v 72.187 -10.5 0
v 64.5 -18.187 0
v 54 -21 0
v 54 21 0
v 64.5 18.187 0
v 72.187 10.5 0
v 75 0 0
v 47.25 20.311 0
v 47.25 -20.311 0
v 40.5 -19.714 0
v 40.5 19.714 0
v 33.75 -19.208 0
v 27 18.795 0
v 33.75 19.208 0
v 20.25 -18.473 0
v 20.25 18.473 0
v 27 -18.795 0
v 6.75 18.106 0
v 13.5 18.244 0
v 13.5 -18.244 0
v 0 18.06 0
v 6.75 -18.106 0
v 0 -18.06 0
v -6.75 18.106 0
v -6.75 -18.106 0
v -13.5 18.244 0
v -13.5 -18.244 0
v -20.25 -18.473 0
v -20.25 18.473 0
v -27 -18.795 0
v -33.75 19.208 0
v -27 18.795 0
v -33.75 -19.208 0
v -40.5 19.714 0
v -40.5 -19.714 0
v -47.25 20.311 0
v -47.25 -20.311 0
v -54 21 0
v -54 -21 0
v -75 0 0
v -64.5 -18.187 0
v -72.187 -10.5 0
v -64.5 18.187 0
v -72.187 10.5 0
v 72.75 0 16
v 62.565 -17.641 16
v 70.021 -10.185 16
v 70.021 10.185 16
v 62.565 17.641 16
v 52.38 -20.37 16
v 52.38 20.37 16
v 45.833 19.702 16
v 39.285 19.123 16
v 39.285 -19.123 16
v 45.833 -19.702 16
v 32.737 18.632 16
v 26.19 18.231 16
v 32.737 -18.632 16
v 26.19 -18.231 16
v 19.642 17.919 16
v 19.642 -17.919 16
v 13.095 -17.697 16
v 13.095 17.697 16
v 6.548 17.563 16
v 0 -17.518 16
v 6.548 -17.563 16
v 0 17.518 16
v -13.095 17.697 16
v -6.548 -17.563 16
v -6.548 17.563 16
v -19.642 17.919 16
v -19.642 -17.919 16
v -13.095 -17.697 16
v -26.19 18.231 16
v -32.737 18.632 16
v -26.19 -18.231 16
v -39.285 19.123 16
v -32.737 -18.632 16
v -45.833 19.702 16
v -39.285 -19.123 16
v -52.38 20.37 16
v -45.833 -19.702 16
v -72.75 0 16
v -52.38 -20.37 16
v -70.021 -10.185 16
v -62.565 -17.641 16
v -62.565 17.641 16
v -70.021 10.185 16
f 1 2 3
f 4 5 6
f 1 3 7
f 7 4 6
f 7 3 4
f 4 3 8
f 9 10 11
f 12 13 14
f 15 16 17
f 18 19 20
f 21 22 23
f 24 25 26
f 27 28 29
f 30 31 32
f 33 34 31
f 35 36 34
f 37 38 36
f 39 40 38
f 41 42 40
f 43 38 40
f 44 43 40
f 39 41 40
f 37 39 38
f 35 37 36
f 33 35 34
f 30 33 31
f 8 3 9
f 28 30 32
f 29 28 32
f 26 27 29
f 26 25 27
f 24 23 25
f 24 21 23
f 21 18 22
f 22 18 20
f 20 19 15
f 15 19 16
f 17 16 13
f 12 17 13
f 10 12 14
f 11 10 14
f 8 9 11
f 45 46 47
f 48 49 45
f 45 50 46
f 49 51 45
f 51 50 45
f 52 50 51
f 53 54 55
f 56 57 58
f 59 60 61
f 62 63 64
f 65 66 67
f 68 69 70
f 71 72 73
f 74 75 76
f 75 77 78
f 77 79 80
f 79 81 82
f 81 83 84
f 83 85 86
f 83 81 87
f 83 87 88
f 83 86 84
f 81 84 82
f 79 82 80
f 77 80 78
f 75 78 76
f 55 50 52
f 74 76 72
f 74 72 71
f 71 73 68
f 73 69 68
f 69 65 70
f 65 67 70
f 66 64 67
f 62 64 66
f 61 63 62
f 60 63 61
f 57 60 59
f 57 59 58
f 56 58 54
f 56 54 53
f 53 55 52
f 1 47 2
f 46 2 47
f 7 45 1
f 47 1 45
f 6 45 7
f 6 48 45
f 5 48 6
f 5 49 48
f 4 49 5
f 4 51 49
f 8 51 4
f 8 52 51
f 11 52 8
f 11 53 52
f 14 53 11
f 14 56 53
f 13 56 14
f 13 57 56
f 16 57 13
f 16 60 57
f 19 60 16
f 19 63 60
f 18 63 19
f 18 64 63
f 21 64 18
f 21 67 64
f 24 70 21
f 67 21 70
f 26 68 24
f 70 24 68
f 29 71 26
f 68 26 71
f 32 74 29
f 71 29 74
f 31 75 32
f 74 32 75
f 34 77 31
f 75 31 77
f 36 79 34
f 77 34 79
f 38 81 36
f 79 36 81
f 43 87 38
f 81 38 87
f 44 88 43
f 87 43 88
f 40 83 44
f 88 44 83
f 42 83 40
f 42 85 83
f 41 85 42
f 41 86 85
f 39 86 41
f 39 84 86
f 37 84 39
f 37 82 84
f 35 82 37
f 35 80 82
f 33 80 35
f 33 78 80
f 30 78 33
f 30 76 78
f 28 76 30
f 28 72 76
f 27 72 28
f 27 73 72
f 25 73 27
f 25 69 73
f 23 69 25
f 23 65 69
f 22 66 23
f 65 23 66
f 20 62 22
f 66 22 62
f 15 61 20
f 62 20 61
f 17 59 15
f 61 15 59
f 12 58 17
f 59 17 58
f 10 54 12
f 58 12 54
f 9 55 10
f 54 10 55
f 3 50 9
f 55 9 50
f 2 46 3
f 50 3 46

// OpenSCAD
$fn = 32;

// ----------------------------------------------------------------------
// Handle: 150 x 42 mm grip, 16 mm thick
// ----------------------------------------------------------------------

// --- parameters (mm) ---
length = 150;             // grip length
width = 42;               // grip width
thickness = 16;           // grip thickness
waist = 0.86;             // width factor at the middle
draft = 0.97;             // top face scale of the extrusion

/* ergonomic grip outline, closed spline-like polygon in the XY plane */
grip = [[-54, 21], [-47.25, 20.311], [-40.5, 19.714], [-33.75, 19.208], [-27, 18.795], [-20.25, 18.473], [-13.5, 18.244], [-6.75, 18.106], [0, 18.06], [6.75, 18.106], [13.5, 18.244], [20.25, 18.473], [27, 18.795], [33.75, 19.208], [40.5, 19.714], [47.25, 20.311], [54, 21], [64.5, 18.187], [72.187, 10.5], [75, 0], [72.187, -10.5], [64.5, -18.187], [54, -21], [54, -21], [47.25, -20.311], [40.5, -19.714], [33.75, -19.208], [27, -18.795], [20.25, -18.473], [13.5, -18.244], [6.75, -18.106], [0, -18.06], [-6.75, -18.106], [-13.5, -18.244], [-20.25, -18.473], [-27, -18.795], [-33.75, -19.208], [-40.5, -19.714], [-47.25, -20.311], [-54, -21], [-64.5, -18.187], [-72.187, -10.5], [-75, 0], [-72.187, 10.5], [-64.5, 18.187], [-54, 21]];

module grip_body() {
  linear_extrude(height = thickness, scale = draft) polygon(grip);
}

difference() {
  union() {
    grip_body();
  }
}
